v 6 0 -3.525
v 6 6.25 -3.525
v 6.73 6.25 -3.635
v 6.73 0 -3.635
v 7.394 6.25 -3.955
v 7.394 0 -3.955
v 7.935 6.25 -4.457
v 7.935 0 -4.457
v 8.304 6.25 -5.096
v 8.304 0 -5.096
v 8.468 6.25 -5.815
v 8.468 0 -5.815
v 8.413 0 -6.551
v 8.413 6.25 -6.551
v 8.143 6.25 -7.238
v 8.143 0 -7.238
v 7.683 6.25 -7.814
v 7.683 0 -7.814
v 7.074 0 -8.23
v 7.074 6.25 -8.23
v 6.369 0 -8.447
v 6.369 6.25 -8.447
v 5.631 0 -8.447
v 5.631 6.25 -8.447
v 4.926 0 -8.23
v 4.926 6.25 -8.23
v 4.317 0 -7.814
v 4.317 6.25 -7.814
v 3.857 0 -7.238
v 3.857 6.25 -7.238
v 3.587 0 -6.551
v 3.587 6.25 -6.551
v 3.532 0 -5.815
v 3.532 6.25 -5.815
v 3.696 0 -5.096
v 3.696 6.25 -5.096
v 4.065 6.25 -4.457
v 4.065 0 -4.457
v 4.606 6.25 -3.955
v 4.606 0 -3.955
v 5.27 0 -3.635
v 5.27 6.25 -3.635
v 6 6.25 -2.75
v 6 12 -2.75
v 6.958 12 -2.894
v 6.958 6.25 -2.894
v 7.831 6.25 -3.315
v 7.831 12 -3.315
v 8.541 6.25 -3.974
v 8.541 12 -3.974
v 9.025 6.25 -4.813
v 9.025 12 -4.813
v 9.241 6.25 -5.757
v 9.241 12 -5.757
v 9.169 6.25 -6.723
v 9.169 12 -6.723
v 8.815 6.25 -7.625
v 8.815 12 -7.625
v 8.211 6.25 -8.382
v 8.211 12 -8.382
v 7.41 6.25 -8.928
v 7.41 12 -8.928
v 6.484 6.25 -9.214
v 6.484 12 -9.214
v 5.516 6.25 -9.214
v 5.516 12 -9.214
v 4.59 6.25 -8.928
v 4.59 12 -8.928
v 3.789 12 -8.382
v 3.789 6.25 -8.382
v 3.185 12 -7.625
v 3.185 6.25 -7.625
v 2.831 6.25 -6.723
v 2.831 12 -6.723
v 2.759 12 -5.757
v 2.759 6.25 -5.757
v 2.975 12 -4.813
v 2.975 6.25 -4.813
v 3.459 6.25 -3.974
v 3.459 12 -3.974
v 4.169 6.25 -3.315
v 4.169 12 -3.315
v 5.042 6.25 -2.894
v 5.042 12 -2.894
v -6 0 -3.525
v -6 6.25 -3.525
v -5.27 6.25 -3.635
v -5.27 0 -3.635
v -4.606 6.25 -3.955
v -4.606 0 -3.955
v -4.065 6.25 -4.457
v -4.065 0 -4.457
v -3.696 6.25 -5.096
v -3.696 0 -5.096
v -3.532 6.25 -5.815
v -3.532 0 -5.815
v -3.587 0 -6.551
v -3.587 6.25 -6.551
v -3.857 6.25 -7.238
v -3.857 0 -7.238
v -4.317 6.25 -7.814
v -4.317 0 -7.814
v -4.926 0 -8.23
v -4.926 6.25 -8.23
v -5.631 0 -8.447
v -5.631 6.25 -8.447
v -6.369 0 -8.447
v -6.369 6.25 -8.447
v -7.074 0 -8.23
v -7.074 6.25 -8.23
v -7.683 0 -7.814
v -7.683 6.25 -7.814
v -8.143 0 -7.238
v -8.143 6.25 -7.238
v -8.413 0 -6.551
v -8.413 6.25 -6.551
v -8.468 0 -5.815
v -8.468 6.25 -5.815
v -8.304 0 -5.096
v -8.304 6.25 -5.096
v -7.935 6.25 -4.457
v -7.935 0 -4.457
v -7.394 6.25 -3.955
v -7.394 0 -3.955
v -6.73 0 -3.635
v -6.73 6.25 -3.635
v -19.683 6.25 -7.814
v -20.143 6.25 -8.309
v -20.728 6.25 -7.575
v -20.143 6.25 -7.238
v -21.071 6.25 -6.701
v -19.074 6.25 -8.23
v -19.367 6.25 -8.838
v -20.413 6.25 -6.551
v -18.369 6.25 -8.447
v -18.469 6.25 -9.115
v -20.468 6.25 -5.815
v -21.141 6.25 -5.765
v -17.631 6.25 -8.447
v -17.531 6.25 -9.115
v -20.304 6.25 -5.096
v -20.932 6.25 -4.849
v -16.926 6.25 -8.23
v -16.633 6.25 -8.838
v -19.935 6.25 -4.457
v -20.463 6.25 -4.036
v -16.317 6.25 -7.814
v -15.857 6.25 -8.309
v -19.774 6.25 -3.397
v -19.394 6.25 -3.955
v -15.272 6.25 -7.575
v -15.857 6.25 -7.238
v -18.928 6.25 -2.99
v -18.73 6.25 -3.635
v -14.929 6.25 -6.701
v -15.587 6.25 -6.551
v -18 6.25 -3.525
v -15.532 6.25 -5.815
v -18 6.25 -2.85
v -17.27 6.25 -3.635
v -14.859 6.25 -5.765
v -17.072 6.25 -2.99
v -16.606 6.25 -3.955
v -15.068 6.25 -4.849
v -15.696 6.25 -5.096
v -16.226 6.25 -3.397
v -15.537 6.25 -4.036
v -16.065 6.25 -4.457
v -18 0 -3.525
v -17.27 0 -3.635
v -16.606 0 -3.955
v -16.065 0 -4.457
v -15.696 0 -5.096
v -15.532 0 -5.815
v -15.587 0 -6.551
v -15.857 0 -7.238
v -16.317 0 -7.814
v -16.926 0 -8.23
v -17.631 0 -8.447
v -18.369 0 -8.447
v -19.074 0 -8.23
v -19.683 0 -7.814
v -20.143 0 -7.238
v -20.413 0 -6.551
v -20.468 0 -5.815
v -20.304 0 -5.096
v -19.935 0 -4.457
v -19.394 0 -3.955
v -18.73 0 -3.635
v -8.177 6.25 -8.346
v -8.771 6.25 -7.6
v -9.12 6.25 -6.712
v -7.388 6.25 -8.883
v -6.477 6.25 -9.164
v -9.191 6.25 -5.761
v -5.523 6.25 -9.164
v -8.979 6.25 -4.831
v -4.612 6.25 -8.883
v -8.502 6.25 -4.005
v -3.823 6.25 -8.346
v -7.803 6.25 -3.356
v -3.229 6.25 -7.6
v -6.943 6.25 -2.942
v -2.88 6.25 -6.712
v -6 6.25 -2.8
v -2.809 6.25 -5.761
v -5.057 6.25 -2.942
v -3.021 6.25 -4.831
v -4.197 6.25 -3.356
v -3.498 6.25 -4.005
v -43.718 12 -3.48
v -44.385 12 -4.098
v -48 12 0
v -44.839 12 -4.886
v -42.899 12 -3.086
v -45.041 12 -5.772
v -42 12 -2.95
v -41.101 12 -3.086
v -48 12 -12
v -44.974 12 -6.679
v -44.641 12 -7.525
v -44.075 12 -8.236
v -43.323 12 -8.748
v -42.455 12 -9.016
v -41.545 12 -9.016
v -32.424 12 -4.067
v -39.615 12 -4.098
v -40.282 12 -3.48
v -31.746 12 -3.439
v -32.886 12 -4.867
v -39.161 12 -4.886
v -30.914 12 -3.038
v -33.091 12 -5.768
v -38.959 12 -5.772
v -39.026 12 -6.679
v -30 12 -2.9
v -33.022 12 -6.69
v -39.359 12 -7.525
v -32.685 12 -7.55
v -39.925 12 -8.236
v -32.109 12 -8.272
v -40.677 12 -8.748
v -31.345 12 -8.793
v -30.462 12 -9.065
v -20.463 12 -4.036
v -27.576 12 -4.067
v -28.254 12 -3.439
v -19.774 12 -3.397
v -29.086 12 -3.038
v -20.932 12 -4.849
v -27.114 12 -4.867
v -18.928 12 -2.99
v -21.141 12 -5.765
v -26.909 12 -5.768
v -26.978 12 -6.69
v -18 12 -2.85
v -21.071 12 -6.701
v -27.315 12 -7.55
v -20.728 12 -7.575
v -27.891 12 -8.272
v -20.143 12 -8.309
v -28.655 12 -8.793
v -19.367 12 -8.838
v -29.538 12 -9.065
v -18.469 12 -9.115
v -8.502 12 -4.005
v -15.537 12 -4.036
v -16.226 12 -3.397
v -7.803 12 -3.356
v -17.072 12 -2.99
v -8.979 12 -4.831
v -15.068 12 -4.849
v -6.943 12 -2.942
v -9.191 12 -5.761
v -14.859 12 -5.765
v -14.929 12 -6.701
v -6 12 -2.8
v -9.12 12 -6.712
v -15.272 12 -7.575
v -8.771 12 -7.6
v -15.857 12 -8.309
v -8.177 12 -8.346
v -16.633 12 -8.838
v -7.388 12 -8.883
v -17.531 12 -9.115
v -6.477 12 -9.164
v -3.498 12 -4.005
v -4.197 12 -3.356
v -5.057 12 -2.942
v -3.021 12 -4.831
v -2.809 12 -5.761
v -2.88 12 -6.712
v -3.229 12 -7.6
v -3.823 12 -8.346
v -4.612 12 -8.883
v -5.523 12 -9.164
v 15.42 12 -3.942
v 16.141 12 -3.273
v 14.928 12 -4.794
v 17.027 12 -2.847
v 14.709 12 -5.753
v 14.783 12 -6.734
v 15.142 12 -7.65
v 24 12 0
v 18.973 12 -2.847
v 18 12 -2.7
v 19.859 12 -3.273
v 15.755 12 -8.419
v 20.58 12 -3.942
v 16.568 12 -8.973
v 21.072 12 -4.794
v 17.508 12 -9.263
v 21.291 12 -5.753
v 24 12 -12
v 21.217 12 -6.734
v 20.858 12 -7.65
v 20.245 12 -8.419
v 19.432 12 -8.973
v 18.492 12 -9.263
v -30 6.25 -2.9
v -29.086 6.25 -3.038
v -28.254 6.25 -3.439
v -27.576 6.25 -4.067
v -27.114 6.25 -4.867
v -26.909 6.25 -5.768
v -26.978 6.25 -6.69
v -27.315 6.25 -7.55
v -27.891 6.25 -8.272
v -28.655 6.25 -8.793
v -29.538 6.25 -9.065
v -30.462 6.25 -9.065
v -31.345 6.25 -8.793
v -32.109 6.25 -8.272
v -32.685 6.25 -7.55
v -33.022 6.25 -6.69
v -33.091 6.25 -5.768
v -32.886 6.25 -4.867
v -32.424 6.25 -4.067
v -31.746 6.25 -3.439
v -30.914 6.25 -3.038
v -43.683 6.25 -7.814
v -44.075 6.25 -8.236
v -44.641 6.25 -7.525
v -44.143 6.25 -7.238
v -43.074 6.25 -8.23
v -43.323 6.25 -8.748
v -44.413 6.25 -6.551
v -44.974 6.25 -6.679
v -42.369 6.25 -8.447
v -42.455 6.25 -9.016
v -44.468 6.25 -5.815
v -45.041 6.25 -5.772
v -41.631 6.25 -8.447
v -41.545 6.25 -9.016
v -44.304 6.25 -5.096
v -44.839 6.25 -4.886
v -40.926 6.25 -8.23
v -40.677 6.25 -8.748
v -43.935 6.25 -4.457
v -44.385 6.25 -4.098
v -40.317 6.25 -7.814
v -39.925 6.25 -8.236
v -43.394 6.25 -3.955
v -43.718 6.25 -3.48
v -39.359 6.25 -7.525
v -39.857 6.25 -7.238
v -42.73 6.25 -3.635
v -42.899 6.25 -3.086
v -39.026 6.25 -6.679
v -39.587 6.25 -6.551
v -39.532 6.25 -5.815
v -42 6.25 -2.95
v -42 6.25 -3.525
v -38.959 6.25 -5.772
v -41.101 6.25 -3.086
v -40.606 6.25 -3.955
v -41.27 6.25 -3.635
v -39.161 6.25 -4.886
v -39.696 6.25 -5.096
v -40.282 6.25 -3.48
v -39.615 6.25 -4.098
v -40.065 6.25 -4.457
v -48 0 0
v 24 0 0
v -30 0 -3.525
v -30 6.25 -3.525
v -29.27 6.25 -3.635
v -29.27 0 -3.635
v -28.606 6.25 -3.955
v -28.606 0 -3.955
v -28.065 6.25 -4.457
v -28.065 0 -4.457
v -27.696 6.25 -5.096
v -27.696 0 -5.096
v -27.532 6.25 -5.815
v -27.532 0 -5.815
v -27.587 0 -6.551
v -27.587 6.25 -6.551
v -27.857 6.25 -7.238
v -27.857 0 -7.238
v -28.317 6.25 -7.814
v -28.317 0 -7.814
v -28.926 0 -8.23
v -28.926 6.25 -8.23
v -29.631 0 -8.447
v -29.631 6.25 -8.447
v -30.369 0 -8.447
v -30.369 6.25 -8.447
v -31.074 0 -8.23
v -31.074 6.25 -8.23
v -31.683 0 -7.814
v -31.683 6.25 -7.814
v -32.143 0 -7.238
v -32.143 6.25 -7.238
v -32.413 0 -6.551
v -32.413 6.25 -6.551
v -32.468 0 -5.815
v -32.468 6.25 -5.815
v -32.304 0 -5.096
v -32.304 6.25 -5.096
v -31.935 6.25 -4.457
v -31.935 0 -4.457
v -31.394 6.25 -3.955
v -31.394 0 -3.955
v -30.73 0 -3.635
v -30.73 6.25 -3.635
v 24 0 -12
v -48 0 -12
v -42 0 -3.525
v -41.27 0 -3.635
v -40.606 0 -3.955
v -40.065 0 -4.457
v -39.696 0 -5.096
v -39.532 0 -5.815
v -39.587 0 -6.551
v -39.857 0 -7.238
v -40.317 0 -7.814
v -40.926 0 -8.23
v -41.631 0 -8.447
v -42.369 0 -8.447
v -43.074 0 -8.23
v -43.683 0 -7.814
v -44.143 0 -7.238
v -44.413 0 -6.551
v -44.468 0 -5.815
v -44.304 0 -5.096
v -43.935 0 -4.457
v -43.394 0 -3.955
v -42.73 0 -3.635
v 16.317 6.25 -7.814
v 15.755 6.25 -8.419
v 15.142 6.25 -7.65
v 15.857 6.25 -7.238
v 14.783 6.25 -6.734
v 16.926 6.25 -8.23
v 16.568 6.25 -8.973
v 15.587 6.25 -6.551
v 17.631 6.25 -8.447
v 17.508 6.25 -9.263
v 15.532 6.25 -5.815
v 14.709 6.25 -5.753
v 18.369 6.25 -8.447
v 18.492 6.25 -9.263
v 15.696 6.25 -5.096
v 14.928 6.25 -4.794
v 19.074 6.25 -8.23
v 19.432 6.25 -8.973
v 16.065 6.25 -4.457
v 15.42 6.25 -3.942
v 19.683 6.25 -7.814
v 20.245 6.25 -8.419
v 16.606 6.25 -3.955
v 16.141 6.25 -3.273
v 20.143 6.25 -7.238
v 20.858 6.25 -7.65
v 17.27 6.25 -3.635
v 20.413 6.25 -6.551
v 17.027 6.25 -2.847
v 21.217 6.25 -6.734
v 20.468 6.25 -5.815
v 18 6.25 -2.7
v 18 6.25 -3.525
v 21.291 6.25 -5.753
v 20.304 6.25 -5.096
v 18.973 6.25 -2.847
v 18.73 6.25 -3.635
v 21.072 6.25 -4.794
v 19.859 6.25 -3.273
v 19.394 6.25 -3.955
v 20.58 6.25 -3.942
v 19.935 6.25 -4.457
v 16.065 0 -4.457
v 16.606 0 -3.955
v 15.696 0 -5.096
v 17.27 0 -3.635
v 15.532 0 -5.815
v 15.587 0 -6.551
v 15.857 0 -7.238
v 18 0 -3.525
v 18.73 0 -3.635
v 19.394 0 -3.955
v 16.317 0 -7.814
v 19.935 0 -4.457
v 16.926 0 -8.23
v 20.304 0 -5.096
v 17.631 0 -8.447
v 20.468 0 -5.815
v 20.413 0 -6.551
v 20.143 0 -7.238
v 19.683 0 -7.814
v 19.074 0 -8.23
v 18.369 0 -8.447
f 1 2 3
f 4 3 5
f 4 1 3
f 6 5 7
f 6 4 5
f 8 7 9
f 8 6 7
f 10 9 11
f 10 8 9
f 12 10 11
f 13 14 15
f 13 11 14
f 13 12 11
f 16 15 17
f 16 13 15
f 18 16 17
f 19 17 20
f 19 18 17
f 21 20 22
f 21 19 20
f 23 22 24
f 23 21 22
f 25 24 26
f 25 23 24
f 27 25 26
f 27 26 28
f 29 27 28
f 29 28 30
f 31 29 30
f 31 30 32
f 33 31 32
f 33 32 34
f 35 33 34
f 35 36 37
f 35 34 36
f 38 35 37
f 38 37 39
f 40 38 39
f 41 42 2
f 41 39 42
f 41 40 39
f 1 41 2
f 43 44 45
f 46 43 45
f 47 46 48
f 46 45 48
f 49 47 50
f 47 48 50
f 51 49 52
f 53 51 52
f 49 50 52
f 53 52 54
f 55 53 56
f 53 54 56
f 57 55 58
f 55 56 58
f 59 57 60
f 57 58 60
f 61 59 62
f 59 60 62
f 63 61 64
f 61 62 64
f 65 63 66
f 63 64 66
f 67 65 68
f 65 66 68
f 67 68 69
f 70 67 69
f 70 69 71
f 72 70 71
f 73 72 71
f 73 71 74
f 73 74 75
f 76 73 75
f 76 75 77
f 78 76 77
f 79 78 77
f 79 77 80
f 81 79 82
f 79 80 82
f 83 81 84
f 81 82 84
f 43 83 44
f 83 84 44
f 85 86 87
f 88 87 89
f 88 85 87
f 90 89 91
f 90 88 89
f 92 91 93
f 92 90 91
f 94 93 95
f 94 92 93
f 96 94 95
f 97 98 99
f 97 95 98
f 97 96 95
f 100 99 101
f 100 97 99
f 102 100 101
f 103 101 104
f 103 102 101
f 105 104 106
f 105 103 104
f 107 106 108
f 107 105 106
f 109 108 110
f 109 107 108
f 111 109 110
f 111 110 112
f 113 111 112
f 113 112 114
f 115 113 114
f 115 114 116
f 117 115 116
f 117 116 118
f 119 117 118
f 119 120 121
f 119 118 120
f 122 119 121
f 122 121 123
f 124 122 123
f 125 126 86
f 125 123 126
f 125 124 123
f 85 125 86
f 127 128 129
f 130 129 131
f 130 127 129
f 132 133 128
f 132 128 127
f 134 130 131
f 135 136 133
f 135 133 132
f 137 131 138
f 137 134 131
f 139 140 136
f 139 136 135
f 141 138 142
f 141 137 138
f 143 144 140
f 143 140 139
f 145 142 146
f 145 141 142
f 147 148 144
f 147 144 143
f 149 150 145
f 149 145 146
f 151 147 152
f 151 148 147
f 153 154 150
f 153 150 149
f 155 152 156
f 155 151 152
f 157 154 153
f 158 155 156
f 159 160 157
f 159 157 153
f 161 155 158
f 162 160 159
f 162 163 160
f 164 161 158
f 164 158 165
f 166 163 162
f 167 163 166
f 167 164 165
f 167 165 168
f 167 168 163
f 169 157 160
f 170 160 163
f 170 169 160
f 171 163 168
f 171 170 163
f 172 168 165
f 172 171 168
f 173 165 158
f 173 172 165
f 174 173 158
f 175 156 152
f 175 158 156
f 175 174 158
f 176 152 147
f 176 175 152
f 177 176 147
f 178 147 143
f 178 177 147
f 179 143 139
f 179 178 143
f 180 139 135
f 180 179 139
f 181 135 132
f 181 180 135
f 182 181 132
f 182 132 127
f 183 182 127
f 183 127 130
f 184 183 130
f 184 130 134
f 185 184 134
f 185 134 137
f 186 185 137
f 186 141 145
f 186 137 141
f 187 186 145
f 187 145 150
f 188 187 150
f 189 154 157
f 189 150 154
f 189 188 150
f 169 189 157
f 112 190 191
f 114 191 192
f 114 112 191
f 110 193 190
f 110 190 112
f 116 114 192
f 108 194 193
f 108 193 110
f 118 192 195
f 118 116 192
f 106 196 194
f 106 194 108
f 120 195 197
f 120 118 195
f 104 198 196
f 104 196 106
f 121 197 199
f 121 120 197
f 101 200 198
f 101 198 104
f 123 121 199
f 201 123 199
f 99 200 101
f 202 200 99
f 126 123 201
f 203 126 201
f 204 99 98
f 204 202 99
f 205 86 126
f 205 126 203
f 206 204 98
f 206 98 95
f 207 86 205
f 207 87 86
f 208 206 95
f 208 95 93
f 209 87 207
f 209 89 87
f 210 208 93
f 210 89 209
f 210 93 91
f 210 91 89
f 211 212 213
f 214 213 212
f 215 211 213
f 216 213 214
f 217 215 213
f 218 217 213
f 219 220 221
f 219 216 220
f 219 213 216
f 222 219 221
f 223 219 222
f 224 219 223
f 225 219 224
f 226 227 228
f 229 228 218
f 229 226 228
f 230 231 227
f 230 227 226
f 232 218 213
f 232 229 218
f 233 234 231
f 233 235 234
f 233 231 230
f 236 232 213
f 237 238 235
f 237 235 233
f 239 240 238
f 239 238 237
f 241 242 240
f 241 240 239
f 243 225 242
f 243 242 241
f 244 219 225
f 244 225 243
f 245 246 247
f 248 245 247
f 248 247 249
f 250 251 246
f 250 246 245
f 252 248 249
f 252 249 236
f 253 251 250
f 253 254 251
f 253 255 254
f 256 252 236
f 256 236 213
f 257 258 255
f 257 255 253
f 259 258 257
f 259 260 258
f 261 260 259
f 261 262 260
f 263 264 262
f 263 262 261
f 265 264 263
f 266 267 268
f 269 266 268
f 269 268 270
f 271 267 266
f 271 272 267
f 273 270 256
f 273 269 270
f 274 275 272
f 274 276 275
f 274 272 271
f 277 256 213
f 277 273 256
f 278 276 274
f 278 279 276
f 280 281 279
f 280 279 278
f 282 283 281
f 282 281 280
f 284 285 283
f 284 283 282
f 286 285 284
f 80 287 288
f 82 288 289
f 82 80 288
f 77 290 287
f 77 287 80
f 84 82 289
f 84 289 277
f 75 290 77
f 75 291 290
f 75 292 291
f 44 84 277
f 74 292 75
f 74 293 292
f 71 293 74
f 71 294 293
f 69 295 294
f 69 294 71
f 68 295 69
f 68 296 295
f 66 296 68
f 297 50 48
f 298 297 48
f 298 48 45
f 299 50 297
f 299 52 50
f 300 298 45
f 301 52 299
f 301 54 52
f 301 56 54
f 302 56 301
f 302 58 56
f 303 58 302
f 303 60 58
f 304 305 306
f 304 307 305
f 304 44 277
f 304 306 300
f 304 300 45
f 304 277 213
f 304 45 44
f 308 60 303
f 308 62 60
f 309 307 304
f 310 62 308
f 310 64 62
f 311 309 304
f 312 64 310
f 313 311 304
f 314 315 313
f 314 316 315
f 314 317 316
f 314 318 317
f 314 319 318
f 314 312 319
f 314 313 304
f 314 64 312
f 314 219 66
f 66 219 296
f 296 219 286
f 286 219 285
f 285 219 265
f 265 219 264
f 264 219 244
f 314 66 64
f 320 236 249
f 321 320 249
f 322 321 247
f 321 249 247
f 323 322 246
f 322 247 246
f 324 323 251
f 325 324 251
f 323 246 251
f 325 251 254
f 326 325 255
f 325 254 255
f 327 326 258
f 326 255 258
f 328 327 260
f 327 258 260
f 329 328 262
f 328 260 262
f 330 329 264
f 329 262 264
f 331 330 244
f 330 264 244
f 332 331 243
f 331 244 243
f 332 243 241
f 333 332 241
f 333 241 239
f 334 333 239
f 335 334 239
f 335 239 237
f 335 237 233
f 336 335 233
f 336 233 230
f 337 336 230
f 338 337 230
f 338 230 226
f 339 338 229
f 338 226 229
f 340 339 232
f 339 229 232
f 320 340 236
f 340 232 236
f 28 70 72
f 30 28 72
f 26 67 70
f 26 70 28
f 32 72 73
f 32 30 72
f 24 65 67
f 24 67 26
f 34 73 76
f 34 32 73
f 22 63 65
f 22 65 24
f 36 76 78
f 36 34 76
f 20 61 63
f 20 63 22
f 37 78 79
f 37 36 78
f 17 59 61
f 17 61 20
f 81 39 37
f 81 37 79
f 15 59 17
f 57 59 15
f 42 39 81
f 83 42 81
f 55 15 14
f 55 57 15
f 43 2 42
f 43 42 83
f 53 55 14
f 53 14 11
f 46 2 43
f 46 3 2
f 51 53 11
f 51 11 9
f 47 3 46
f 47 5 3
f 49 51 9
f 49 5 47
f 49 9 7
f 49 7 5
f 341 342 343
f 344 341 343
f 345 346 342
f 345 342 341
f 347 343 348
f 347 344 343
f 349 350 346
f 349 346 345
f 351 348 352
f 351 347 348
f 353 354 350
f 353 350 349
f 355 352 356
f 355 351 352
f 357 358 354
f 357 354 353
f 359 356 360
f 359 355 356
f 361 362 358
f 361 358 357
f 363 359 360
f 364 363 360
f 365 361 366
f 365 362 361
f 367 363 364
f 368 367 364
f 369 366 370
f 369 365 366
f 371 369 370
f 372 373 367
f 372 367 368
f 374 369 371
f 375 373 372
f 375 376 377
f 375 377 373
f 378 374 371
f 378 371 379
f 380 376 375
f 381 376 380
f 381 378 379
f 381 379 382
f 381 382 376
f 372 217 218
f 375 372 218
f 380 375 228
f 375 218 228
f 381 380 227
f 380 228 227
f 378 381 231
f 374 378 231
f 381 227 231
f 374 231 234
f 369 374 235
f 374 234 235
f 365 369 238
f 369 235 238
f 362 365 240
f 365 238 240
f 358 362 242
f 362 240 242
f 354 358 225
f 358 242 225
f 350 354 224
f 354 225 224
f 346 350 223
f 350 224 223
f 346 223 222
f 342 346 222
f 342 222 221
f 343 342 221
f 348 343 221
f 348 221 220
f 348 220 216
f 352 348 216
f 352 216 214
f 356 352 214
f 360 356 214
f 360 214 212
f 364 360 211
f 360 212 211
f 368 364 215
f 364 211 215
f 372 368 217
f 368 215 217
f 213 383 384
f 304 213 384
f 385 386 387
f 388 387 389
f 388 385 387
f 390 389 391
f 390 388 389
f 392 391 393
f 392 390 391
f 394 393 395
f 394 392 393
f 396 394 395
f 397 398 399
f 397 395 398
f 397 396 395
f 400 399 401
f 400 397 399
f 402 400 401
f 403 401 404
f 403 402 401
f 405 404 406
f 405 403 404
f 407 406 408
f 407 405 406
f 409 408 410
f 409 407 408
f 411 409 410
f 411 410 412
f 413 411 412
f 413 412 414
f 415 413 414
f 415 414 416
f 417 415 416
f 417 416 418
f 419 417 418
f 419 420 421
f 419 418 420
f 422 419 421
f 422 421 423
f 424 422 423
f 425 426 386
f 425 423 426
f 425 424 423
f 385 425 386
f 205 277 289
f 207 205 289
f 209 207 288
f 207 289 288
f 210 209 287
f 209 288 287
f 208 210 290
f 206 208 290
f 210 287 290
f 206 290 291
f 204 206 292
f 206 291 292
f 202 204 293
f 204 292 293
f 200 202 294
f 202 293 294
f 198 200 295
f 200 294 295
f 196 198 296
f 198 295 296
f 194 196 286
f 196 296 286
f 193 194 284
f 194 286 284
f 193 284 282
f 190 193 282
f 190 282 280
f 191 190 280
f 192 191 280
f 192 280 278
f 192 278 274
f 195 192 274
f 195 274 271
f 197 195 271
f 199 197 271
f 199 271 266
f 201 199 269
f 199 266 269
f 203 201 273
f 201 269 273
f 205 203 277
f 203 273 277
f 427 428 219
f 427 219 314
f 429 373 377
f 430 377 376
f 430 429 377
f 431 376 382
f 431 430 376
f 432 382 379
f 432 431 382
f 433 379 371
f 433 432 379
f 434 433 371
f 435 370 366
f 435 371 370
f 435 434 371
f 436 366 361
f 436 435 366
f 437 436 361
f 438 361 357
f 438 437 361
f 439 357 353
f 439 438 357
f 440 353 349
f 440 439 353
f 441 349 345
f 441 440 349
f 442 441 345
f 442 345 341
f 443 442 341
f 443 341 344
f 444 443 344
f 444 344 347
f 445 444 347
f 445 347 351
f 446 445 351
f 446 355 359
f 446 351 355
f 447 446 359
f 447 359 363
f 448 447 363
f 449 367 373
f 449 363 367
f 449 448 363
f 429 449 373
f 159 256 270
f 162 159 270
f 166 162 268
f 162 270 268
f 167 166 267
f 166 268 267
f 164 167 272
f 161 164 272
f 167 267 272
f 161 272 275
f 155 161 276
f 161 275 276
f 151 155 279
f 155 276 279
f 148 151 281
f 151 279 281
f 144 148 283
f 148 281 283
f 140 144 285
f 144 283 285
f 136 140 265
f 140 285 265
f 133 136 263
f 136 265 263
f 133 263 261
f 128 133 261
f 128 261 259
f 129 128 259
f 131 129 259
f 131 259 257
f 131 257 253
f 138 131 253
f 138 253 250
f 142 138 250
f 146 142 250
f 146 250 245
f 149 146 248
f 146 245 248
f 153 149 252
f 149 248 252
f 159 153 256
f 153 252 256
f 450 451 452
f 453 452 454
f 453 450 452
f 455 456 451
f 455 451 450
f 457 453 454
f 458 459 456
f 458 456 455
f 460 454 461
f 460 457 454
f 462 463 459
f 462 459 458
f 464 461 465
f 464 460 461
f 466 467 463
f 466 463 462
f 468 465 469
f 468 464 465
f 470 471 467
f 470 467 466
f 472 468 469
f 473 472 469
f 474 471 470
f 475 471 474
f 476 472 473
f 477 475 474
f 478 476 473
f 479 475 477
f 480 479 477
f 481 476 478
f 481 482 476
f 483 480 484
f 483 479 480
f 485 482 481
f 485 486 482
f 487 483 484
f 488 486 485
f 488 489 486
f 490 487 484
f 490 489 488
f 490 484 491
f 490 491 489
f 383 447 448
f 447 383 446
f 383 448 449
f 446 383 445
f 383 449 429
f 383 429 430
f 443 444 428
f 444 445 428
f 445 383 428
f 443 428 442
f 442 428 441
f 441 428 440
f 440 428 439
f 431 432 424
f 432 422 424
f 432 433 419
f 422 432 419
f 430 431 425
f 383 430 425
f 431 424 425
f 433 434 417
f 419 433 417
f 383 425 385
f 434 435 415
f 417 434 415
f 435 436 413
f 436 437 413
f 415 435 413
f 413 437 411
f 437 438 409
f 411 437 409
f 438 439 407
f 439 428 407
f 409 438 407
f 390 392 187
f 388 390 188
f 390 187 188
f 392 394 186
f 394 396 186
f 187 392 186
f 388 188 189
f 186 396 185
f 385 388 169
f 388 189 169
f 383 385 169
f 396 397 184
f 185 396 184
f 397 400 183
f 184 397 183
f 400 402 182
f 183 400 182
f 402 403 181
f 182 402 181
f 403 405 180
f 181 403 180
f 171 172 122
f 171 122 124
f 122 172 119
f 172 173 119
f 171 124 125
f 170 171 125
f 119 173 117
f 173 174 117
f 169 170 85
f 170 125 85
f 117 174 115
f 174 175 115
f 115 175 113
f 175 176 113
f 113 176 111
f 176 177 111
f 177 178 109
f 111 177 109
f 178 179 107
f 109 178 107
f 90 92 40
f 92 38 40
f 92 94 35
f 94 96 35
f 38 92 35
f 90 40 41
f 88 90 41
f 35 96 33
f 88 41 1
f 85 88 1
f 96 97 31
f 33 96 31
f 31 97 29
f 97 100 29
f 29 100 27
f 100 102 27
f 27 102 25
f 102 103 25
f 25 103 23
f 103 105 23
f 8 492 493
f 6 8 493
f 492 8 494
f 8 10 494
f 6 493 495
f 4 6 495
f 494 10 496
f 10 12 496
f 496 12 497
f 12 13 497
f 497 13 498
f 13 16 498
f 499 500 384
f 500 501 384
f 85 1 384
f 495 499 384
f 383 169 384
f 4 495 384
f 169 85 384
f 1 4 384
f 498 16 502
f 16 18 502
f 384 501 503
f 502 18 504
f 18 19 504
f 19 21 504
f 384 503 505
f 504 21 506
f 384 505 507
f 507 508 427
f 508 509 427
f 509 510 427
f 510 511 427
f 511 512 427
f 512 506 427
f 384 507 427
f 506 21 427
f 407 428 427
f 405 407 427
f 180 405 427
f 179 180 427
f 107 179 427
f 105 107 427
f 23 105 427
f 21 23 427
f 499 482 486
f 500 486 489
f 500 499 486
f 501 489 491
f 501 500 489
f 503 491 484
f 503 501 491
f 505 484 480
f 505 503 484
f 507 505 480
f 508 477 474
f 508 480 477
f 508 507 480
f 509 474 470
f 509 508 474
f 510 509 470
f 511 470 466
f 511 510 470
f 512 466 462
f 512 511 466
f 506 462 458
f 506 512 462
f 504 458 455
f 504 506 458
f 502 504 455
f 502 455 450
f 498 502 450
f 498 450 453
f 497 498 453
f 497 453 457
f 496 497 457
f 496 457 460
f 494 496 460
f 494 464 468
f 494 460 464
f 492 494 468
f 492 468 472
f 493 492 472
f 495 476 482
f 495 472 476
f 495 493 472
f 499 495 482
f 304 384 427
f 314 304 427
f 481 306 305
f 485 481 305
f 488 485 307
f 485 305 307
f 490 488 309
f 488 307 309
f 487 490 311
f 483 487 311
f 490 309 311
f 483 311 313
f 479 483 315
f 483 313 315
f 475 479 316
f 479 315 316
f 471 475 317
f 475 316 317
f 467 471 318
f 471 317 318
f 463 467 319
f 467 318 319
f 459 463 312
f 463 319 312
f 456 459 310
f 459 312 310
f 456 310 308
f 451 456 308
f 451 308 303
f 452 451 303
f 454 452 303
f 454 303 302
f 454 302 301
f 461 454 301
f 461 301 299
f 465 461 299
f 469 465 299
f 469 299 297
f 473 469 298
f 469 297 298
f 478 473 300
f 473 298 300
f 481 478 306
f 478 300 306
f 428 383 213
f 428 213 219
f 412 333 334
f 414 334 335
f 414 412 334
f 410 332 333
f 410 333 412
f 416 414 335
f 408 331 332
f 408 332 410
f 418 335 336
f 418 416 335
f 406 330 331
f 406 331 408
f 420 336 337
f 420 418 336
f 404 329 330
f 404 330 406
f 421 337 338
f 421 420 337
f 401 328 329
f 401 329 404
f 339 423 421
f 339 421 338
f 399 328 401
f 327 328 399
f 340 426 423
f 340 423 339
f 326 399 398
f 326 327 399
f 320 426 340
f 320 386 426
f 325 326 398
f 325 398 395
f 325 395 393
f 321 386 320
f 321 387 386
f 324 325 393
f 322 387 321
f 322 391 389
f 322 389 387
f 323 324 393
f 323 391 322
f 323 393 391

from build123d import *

# Parameters (mm, degrees)
SKETCH1_W           = 12
SKETCH1_H           = 12
SKETCH1_R           = 2.475
BOSS_EXTRUDE1_DEPTH = 12
LPATTERN1_COUNT     = 5
LPATTERN1_PITCH     = 12
LPATTERN1_COL_COUNT = 2
LPATTERN1_COL_PITCH = 12
SKETCH2_R           = 3.05
SKETCH2_R_2         = 3.1
SKETCH2_R_3         = 3.15
SKETCH2_R_4         = 3.2
SKETCH2_R_5         = 3.25
SKETCH2_R_6         = 3.3
CUT_EXTRUDE1_DEPTH  = 5.75


with BuildPart() as part:
    # Sketch1 → Boss-Extrude1 (new body)
    with BuildSketch(Plane(origin=(0, 0, 0), x_dir=(1, 0, 0), z_dir=(0, 1, 0))):
        with Locations((6, 6)):
            Rectangle(SKETCH1_W, SKETCH1_H)
        with Locations(Location((6, 6, 0), (0, 0, 270))):
            Circle(SKETCH1_R, mode=Mode.SUBTRACT)
    boss_extrude1 = extrude(amount=BOSS_EXTRUDE1_DEPTH)

    # LPattern1: Boss-Extrude1 ×5
    with Locations(*[(-i * LPATTERN1_PITCH, 0, 0) for i in range(1, LPATTERN1_COUNT)]):
        add(boss_extrude1)


with BuildPart() as lpattern1_col_1:
    # LPattern1 col: Boss-Extrude1 ×2
    with Locations(*[(i * LPATTERN1_COL_PITCH, 0, 0) for i in range(1, LPATTERN1_COL_COUNT)]):
        add(boss_extrude1)


with BuildPart() as part_1:
    add(part.part)

    # LPattern1 col united with what the copie: union LPattern1 col_1
    add(lpattern1_col_1.part)

    # Sketch2 → Cut-Extrude1 (cut)
    with BuildSketch(Plane(origin=(0, 12, 0), x_dir=(1, 0, 0), z_dir=(0, 1, 0))):
        with Locations(Location((-42, 6, 0), (0, 0, 270))):
            Circle(SKETCH2_R)
        with Locations(Location((-30, 6, 0), (0, 0, 270))):
            Circle(SKETCH2_R_2)
        with Locations(Location((-18, 6, 0), (0, 0, 270))):
            Circle(SKETCH2_R_3)
        with Locations(Location((-6, 6, 0), (0, 0, 270))):
            Circle(SKETCH2_R_4)
        with Locations(Location((6, 6, 0), (0, 0, 270))):
            Circle(SKETCH2_R_5)
        with Locations(Location((18, 6, 0), (0, 0, 270))):
            Circle(SKETCH2_R_6)
    extrude(amount=-CUT_EXTRUDE1_DEPTH, mode=Mode.SUBTRACT)


solid = part_1.part
